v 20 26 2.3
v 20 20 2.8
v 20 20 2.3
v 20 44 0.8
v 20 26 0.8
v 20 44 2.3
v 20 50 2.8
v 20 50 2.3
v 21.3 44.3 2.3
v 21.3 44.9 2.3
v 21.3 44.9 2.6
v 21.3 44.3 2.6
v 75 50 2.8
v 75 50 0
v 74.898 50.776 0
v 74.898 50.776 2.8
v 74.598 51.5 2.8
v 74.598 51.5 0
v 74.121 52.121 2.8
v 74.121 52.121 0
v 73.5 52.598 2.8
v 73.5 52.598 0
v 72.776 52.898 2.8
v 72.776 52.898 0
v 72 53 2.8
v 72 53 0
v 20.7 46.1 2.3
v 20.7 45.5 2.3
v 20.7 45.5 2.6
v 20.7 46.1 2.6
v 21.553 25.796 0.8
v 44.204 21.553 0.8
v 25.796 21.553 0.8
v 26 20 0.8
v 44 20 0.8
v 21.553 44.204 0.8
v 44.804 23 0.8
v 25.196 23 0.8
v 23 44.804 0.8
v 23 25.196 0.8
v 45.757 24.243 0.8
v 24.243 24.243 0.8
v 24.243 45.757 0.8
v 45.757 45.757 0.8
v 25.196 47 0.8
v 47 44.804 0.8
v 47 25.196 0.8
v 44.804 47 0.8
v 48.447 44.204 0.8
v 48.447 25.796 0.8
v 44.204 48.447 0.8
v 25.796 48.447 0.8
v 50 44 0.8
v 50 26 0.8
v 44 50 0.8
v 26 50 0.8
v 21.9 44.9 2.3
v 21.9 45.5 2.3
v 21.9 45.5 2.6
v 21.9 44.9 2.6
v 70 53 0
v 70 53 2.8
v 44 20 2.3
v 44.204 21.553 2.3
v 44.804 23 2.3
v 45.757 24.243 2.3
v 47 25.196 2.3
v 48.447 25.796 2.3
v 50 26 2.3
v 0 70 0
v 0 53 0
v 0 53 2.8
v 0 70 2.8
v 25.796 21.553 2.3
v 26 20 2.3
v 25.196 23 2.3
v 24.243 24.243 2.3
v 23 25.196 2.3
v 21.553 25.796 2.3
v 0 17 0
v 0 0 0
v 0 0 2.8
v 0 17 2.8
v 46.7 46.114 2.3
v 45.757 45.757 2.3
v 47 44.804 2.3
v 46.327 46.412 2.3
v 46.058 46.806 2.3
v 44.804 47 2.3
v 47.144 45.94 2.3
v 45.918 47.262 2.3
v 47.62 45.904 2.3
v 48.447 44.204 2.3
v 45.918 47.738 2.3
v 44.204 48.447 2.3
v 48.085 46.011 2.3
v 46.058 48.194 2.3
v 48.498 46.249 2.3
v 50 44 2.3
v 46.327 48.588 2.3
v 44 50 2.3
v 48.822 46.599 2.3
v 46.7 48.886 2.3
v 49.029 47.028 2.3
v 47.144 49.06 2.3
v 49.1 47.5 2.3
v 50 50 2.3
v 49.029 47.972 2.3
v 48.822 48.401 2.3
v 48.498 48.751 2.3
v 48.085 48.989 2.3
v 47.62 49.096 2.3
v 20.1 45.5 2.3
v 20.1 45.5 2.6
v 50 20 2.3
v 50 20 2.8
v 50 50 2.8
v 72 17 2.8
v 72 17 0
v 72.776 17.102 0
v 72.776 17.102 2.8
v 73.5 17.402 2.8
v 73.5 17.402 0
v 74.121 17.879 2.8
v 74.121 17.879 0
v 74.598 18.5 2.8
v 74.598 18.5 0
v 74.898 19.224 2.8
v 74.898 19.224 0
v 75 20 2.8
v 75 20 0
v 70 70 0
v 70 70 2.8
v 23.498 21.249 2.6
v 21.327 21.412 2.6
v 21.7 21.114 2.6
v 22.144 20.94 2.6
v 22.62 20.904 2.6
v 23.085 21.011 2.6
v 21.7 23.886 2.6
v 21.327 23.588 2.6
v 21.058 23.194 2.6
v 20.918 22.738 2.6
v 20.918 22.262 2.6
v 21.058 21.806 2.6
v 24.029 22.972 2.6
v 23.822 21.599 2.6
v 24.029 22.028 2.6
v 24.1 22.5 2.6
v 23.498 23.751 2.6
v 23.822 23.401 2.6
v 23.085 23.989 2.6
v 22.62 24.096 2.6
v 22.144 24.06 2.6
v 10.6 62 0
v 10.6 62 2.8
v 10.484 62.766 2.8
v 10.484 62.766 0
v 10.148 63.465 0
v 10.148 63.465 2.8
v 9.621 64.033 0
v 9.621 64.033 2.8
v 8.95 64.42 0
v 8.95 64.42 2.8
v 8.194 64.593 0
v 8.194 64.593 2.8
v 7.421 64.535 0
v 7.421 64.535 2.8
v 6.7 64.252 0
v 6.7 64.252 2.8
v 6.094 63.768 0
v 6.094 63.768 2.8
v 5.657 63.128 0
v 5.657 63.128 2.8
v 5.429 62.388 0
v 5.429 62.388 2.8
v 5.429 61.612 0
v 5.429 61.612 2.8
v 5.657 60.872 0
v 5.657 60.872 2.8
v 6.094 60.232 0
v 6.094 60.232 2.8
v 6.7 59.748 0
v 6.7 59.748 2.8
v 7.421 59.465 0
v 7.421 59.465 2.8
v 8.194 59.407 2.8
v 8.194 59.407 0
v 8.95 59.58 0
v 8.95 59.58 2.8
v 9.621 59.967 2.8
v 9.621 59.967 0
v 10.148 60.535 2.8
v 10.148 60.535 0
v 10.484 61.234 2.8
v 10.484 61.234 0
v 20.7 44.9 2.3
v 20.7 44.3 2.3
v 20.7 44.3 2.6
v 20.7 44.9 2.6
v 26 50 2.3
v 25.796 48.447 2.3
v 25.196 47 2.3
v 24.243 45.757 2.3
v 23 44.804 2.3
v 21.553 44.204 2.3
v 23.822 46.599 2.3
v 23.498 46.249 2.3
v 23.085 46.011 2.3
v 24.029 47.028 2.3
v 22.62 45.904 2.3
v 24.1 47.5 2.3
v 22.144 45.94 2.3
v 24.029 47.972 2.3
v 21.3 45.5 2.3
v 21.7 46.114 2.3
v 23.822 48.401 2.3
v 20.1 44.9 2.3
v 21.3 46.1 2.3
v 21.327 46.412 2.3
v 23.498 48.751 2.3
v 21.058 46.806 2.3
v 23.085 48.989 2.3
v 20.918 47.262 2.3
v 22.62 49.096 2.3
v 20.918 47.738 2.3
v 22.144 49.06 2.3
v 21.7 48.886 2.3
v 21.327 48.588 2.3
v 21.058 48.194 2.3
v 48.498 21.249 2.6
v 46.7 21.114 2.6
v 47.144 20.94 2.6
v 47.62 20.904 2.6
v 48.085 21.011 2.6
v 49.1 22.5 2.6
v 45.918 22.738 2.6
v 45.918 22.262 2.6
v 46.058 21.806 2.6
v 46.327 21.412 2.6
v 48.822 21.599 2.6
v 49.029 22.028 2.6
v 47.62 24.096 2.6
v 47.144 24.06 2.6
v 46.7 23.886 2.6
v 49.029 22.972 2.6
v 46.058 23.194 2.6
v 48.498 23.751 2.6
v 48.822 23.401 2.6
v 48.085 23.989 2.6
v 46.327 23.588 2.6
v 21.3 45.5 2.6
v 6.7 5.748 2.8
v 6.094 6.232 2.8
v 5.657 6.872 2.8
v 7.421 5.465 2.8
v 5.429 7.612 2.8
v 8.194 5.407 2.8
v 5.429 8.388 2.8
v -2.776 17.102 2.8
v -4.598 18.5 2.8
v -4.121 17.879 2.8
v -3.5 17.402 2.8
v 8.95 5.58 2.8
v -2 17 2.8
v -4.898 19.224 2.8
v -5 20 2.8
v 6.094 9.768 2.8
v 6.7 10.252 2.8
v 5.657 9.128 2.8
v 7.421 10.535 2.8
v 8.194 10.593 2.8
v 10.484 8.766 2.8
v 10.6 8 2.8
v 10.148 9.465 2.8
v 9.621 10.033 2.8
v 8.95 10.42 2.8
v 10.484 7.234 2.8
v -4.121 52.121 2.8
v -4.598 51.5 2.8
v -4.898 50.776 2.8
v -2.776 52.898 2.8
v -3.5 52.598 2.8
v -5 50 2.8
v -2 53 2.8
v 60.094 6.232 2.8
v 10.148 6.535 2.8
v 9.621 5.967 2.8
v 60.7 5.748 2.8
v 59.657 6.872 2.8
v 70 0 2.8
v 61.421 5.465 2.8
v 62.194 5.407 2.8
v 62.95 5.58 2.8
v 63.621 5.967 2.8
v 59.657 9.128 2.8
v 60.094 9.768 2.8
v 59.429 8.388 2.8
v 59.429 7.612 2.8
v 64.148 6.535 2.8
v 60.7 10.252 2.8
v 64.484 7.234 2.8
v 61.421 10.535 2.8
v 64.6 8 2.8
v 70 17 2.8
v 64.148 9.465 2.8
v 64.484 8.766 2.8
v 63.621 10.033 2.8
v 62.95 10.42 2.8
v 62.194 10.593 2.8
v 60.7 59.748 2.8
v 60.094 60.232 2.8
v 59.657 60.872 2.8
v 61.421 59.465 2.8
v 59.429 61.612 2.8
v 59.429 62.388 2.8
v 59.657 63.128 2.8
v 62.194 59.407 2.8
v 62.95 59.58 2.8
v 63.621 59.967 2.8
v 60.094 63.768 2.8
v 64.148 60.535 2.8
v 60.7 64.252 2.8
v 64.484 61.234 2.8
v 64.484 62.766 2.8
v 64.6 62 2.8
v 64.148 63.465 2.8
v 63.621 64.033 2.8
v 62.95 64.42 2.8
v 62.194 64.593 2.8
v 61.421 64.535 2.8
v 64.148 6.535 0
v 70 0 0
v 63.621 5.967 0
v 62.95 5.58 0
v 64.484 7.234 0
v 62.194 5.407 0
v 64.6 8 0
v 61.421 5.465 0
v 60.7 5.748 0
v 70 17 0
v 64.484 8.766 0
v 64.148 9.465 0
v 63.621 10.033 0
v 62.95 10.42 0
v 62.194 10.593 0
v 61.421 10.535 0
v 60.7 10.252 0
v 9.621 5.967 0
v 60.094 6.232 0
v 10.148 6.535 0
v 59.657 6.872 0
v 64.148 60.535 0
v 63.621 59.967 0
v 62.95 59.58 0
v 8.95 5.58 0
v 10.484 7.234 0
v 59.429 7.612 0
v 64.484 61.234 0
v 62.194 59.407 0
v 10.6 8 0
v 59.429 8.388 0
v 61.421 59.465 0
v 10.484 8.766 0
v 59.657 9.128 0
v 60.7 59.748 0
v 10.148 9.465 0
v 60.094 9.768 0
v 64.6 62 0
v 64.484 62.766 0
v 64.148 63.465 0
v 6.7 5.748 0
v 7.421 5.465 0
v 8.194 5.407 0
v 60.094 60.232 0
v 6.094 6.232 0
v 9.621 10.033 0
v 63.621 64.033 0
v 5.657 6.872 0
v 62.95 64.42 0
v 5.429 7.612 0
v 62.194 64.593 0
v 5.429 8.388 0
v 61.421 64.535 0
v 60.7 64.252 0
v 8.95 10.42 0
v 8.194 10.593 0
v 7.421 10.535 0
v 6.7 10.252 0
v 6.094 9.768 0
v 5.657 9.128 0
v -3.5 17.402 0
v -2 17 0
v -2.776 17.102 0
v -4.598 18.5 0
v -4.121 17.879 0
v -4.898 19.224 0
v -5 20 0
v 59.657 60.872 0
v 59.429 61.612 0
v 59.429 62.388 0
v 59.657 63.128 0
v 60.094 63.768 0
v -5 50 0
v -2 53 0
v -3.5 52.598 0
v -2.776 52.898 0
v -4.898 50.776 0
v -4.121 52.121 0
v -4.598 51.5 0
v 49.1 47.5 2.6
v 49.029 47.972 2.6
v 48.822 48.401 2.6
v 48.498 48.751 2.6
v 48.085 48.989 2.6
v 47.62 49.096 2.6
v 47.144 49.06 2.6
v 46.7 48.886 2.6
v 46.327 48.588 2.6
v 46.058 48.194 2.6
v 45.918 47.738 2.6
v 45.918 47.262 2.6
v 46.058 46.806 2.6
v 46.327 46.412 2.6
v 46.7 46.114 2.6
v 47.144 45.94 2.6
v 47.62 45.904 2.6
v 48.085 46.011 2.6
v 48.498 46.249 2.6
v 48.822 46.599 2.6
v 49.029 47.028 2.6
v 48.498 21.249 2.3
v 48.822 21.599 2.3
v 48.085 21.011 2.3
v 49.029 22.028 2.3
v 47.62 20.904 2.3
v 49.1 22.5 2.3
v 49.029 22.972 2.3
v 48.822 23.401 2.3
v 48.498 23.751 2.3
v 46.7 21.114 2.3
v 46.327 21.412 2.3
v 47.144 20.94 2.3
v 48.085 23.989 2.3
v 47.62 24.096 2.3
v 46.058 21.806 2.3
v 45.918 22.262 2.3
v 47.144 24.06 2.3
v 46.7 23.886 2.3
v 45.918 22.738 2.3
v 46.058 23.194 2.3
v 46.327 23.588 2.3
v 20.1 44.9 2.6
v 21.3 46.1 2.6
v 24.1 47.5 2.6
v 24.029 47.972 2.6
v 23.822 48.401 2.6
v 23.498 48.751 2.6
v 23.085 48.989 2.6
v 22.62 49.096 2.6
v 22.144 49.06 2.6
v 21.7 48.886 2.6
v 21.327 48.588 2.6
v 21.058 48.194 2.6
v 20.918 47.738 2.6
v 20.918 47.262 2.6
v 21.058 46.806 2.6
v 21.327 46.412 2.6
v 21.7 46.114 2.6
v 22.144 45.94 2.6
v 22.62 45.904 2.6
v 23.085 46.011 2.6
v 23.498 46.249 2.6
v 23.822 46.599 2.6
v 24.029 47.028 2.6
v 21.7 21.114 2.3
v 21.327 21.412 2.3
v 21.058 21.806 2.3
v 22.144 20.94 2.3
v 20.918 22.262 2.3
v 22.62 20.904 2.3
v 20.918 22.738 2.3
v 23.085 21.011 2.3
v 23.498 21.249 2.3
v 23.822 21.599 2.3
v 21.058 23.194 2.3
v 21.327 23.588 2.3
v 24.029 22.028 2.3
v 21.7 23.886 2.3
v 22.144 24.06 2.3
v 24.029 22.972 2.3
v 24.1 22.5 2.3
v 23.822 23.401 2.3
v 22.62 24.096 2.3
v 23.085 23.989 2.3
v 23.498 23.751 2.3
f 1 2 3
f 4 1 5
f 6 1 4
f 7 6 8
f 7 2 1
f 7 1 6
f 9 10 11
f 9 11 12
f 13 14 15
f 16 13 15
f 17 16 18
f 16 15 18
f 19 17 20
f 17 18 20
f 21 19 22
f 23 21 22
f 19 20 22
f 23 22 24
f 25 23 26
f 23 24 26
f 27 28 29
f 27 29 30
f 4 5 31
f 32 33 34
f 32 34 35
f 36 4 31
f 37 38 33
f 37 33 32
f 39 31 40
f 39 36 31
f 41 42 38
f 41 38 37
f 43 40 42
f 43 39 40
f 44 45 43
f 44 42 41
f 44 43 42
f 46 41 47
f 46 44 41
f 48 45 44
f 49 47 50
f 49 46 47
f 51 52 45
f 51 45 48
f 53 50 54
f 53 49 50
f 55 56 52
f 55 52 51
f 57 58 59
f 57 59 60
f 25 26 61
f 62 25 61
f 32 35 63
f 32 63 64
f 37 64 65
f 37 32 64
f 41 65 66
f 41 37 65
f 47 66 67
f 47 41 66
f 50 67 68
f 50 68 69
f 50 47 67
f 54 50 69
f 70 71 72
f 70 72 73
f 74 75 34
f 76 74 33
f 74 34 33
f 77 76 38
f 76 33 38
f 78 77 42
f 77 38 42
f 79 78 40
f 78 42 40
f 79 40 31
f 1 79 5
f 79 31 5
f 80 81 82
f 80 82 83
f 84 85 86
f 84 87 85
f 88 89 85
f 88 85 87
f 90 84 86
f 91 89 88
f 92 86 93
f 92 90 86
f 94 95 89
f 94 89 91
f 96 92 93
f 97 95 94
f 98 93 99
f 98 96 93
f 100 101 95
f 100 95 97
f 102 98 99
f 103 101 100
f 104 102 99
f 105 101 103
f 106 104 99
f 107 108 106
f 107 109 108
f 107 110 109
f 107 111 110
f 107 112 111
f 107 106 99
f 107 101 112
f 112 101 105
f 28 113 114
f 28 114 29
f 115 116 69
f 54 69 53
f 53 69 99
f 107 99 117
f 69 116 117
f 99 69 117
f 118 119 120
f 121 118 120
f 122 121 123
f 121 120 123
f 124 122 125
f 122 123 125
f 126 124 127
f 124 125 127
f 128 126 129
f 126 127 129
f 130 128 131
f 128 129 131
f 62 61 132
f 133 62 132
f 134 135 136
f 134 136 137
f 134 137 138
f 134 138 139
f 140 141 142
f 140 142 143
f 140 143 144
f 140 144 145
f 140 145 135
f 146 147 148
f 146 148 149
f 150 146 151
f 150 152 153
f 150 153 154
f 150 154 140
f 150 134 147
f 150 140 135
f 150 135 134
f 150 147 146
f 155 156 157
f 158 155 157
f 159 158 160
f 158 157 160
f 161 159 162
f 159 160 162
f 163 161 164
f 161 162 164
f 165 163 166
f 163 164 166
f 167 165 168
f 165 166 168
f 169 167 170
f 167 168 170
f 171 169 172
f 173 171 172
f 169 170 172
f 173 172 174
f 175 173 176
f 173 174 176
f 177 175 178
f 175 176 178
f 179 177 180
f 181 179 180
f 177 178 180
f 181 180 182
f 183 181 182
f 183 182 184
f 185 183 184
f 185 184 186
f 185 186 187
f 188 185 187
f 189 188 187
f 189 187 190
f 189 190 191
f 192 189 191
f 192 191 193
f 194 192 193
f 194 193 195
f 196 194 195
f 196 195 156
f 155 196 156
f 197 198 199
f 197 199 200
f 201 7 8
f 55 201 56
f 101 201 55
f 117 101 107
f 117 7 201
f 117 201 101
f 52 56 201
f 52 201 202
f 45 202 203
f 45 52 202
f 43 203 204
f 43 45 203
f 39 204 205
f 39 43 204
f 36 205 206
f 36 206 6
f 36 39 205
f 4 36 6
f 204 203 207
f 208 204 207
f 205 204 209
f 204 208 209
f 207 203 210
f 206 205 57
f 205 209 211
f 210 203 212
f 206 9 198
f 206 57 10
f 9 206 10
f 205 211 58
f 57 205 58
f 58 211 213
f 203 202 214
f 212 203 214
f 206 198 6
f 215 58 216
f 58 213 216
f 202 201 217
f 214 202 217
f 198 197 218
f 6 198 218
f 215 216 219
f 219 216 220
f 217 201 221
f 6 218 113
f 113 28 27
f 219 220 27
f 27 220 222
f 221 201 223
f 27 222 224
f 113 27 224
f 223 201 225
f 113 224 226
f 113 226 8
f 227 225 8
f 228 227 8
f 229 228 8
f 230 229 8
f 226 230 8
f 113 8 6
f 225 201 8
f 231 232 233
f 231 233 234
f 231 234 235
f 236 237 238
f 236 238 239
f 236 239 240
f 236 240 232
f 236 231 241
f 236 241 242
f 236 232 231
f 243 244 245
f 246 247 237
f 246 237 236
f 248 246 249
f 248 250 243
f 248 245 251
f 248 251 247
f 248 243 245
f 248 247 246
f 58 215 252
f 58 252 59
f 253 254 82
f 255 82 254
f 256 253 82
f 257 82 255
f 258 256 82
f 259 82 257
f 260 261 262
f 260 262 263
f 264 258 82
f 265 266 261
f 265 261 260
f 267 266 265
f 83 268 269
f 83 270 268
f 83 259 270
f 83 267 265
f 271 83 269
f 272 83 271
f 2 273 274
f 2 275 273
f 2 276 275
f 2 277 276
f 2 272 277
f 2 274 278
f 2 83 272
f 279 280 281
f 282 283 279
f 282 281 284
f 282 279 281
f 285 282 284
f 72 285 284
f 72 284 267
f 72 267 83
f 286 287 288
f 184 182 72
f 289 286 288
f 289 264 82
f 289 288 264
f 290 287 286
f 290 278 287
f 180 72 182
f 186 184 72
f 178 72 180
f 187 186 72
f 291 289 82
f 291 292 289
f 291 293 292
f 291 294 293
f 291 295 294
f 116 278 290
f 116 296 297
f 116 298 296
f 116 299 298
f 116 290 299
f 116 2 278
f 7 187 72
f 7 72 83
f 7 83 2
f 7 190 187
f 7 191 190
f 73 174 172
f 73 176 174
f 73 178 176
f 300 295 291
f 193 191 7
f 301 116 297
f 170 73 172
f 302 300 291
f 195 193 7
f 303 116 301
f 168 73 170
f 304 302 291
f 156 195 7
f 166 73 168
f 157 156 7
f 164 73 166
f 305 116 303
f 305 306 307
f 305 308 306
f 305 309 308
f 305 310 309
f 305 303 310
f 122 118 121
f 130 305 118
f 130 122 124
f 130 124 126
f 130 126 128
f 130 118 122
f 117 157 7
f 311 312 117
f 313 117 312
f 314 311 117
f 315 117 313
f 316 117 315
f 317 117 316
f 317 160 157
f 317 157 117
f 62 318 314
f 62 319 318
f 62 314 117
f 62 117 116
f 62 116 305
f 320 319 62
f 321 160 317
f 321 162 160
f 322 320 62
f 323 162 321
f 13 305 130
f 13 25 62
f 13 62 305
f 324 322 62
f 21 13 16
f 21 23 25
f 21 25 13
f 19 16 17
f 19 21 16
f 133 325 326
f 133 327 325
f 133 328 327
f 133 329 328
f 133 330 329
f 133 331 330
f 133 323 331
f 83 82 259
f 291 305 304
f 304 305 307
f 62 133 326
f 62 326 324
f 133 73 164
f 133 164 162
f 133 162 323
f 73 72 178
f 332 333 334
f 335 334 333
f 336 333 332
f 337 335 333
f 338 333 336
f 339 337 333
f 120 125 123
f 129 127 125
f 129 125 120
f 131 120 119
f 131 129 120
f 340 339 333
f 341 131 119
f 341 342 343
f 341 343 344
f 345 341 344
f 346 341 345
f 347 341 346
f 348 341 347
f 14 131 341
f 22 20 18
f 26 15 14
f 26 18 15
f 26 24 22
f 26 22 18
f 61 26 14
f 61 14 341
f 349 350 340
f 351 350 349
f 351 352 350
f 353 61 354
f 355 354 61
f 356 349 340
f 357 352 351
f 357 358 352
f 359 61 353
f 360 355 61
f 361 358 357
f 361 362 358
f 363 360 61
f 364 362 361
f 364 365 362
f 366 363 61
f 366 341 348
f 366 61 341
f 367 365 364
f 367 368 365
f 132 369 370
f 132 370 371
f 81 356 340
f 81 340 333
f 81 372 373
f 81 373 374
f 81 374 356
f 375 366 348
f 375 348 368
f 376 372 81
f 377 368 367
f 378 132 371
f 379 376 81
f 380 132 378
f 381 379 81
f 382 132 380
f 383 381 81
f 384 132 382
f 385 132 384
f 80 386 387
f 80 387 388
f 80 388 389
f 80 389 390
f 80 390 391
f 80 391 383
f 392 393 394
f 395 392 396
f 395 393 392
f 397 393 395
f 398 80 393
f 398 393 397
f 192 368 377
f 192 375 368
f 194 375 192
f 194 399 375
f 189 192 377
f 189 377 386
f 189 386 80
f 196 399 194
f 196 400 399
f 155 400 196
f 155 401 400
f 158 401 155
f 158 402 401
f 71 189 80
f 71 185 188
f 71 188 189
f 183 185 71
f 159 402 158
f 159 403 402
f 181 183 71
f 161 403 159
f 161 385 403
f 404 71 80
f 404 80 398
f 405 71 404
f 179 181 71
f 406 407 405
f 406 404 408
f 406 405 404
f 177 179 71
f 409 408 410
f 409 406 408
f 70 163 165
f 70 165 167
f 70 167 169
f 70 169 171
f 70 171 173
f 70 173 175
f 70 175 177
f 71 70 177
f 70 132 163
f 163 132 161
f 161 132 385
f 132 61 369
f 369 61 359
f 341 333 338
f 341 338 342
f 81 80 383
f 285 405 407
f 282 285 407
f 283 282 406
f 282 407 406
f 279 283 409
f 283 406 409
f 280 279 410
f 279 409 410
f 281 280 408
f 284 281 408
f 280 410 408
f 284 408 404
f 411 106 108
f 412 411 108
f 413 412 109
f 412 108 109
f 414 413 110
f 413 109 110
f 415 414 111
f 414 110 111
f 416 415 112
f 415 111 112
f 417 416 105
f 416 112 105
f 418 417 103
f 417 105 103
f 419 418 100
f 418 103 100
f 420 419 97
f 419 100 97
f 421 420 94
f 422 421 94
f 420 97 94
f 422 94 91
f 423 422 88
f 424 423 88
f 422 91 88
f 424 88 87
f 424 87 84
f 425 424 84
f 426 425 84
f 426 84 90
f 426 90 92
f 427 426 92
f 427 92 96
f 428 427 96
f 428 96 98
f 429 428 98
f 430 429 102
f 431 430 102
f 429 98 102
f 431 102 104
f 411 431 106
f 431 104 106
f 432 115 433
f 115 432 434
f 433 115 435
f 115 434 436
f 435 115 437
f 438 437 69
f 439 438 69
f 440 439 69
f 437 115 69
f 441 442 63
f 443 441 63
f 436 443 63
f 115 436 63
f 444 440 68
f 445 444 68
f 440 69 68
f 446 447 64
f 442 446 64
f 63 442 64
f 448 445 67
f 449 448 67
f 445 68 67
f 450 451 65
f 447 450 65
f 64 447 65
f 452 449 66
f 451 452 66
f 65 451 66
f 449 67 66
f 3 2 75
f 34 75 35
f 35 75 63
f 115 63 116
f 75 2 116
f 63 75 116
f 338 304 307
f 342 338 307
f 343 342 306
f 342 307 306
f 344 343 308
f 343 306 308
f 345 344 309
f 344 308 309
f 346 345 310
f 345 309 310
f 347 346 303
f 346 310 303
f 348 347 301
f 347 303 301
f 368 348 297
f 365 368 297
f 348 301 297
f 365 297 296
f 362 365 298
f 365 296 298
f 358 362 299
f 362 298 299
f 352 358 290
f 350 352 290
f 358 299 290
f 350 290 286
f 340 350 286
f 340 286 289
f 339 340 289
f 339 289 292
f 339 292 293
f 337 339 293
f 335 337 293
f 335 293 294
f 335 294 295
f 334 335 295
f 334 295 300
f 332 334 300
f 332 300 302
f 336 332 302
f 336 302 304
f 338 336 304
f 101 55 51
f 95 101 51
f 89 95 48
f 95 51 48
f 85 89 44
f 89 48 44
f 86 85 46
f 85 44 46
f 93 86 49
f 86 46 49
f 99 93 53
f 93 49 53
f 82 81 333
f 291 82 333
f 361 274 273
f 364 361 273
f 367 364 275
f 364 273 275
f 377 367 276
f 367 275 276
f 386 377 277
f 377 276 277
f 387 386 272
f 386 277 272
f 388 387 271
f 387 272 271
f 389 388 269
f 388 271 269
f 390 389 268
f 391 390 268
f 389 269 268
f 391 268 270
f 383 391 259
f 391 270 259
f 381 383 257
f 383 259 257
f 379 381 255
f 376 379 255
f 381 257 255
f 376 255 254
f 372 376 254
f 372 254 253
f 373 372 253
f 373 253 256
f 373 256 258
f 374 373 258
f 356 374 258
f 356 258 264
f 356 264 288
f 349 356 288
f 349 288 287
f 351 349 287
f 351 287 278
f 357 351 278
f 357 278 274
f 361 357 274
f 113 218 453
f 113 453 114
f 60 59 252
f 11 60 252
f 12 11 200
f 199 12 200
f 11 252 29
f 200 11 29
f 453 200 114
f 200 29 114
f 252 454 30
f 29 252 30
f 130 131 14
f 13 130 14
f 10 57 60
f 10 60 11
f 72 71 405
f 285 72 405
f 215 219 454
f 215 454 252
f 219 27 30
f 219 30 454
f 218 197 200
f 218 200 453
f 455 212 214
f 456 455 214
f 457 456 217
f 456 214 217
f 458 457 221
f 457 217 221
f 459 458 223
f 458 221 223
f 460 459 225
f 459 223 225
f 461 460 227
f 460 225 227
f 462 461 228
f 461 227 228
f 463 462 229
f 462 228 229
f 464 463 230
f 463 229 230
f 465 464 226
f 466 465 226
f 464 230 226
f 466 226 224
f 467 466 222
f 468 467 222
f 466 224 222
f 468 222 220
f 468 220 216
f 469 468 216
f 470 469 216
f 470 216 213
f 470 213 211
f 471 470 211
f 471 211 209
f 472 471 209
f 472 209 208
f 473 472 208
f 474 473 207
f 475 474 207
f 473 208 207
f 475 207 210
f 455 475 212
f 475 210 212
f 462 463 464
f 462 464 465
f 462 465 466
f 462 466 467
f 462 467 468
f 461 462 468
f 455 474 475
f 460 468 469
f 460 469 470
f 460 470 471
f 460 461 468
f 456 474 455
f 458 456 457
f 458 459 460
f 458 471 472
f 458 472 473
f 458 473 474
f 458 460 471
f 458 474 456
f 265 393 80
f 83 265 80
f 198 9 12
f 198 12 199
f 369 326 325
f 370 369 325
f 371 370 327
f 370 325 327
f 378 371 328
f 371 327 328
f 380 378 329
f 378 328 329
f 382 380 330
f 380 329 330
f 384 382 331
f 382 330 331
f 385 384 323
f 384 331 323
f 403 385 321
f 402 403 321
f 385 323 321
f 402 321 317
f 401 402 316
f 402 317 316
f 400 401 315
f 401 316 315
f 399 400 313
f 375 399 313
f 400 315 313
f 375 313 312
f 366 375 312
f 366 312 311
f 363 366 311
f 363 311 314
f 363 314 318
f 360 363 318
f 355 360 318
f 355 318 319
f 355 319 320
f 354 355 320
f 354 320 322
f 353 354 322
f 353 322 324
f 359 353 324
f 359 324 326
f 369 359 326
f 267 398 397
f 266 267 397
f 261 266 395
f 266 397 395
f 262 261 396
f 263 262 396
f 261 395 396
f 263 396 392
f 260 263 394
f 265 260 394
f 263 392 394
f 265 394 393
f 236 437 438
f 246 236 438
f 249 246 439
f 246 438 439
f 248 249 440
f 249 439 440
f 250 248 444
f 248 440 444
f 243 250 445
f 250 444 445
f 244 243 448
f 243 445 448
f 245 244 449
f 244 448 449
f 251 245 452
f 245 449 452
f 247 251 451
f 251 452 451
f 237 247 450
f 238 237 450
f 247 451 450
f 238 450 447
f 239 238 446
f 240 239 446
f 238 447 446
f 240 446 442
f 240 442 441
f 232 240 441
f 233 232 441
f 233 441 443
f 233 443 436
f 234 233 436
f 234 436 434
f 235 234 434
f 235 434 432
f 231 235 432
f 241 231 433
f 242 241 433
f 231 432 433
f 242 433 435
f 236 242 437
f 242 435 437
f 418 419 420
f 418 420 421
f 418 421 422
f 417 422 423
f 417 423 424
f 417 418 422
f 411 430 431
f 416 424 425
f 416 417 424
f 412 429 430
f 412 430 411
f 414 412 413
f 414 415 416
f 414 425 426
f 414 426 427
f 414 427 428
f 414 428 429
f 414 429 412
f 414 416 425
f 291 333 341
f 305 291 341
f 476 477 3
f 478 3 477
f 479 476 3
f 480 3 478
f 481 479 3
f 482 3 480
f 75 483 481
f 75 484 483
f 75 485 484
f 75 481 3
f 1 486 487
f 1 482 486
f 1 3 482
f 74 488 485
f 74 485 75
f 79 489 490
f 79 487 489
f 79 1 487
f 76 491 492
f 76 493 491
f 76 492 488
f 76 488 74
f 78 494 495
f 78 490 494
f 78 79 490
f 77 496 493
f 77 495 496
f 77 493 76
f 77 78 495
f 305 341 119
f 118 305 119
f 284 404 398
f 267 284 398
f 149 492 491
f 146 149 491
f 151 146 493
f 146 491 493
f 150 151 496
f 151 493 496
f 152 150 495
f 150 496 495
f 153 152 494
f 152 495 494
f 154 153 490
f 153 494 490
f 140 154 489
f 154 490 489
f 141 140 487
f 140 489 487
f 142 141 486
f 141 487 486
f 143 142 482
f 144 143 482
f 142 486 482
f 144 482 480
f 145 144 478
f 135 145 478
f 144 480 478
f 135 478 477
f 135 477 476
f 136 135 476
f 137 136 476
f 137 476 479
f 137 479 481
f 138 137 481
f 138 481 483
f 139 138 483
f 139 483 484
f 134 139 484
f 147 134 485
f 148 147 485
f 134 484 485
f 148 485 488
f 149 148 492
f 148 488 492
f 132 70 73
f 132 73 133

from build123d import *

# Parameters (mm, degrees)
SKETCH_1_W          = 70
SKETCH_1_H          = 70
EXTRUDE_1_DEPTH     = 2.8
SKETCH_2_W          = 30
SKETCH_2_H          = 30
CUT_EXTRUDE_1_DEPTH = 2
SKETCH_3_R          = 2.6
CUT_EXTRUDE_2_DEPTH = 3
EXTRUDE_2_DEPTH     = 2.3
SKETCH_6_R          = 1.6
EXTRUDE_3_DEPTH     = 0.3


with BuildPart() as part:
    # 草图1 → 凸台-拉伸1 (new body)
    with BuildSketch(Plane.XY):
        with BuildLine():
            Line((-2, 17), (0, 17))
            Line((0, 17), (0, 53))
            Line((0, 53), (-2, 53))
            ThreePointArc((-2, 53), (-4.121320344, 52.121320344), (-5, 50))
            Line((-5, 50), (-5, 20))
            ThreePointArc((-5, 20), (-4.121320344, 17.878679656), (-2, 17))
        make_face()
        with Locations((35, 35)):
            Rectangle(SKETCH_1_W, SKETCH_1_H)
        with BuildLine():
            Line((70, 53), (70, 17))
            Line((70, 17), (72, 17))
            ThreePointArc((72, 17), (74.121320344, 17.878679656), (75, 20))
            Line((75, 20), (75, 50))
            ThreePointArc((75, 50), (74.121320344, 52.121320344), (72, 53))
            Line((72, 53), (70, 53))
        make_face()
    extrude(amount=EXTRUDE_1_DEPTH)

    # 草图2 → 切除-拉伸1 (cut)
    with BuildSketch(Plane.XY.offset(2.8)):
        with Locations((35, 35)):
            Rectangle(SKETCH_2_W, SKETCH_2_H)
    extrude(amount=-CUT_EXTRUDE_1_DEPTH, mode=Mode.SUBTRACT)

    # 草图3 → 切除-拉伸2 (cut)
    with BuildSketch(Plane.XY.offset(2.8)):
        with Locations((8, 62)):
            Circle(SKETCH_3_R)
        with Locations((62, 62)):
            Circle(SKETCH_3_R)
        with Locations((8, 8)):
            Circle(SKETCH_3_R)
        with Locations((62, 8)):
            Circle(SKETCH_3_R)
    extrude(amount=-CUT_EXTRUDE_2_DEPTH, mode=Mode.SUBTRACT)

    # 草图4 → 凸台-拉伸2 (add)
    with BuildSketch(Plane.XY):
        with BuildLine():
            Line((20, 44), (20, 50))
            Line((20, 50), (26, 50))
            ThreePointArc((26, 50), (24.242640687, 45.757359313), (20, 44))
        make_face()
        with BuildLine():
            Line((50, 44), (50, 50))
            Line((50, 50), (44, 50))
            ThreePointArc((44, 50), (45.757359313, 45.757359313), (50, 44))
        make_face()
        with BuildLine():
            Line((50, 20), (44, 20))
            ThreePointArc((44, 20), (45.757359313, 24.242640687), (50, 26))
            Line((50, 26), (50, 20))
        make_face()
        with BuildLine():
            Line((20, 26), (20, 20))
            Line((20, 20), (26, 20))
            ThreePointArc((26, 20), (24.242640687, 24.242640687), (20, 26))
        make_face()
    extrude(amount=EXTRUDE_2_DEPTH)

    # 草图6 → 凸台-拉伸3 (add)
    with BuildSketch(Plane.XY.offset(2.3)):
        with Locations((22.5, 47.5)):
            Circle(SKETCH_6_R)
        with Locations((47.5, 47.5)):
            Circle(SKETCH_6_R)
        with Locations((47.5, 22.5)):
            Circle(SKETCH_6_R)
        with Locations((22.5, 22.5)):
            Circle(SKETCH_6_R)
        Polygon((20.1, 45.5), (20.7, 45.5), (20.7, 46.1), (21.3, 46.1), (21.3, 45.5), (21.9, 45.5), (21.9, 44.9), (21.3, 44.9), (21.3, 44.3), (20.7, 44.3), (20.7, 44.9), (20.1, 44.9), align=None)
    extrude(amount=EXTRUDE_3_DEPTH)


solid = part.part
